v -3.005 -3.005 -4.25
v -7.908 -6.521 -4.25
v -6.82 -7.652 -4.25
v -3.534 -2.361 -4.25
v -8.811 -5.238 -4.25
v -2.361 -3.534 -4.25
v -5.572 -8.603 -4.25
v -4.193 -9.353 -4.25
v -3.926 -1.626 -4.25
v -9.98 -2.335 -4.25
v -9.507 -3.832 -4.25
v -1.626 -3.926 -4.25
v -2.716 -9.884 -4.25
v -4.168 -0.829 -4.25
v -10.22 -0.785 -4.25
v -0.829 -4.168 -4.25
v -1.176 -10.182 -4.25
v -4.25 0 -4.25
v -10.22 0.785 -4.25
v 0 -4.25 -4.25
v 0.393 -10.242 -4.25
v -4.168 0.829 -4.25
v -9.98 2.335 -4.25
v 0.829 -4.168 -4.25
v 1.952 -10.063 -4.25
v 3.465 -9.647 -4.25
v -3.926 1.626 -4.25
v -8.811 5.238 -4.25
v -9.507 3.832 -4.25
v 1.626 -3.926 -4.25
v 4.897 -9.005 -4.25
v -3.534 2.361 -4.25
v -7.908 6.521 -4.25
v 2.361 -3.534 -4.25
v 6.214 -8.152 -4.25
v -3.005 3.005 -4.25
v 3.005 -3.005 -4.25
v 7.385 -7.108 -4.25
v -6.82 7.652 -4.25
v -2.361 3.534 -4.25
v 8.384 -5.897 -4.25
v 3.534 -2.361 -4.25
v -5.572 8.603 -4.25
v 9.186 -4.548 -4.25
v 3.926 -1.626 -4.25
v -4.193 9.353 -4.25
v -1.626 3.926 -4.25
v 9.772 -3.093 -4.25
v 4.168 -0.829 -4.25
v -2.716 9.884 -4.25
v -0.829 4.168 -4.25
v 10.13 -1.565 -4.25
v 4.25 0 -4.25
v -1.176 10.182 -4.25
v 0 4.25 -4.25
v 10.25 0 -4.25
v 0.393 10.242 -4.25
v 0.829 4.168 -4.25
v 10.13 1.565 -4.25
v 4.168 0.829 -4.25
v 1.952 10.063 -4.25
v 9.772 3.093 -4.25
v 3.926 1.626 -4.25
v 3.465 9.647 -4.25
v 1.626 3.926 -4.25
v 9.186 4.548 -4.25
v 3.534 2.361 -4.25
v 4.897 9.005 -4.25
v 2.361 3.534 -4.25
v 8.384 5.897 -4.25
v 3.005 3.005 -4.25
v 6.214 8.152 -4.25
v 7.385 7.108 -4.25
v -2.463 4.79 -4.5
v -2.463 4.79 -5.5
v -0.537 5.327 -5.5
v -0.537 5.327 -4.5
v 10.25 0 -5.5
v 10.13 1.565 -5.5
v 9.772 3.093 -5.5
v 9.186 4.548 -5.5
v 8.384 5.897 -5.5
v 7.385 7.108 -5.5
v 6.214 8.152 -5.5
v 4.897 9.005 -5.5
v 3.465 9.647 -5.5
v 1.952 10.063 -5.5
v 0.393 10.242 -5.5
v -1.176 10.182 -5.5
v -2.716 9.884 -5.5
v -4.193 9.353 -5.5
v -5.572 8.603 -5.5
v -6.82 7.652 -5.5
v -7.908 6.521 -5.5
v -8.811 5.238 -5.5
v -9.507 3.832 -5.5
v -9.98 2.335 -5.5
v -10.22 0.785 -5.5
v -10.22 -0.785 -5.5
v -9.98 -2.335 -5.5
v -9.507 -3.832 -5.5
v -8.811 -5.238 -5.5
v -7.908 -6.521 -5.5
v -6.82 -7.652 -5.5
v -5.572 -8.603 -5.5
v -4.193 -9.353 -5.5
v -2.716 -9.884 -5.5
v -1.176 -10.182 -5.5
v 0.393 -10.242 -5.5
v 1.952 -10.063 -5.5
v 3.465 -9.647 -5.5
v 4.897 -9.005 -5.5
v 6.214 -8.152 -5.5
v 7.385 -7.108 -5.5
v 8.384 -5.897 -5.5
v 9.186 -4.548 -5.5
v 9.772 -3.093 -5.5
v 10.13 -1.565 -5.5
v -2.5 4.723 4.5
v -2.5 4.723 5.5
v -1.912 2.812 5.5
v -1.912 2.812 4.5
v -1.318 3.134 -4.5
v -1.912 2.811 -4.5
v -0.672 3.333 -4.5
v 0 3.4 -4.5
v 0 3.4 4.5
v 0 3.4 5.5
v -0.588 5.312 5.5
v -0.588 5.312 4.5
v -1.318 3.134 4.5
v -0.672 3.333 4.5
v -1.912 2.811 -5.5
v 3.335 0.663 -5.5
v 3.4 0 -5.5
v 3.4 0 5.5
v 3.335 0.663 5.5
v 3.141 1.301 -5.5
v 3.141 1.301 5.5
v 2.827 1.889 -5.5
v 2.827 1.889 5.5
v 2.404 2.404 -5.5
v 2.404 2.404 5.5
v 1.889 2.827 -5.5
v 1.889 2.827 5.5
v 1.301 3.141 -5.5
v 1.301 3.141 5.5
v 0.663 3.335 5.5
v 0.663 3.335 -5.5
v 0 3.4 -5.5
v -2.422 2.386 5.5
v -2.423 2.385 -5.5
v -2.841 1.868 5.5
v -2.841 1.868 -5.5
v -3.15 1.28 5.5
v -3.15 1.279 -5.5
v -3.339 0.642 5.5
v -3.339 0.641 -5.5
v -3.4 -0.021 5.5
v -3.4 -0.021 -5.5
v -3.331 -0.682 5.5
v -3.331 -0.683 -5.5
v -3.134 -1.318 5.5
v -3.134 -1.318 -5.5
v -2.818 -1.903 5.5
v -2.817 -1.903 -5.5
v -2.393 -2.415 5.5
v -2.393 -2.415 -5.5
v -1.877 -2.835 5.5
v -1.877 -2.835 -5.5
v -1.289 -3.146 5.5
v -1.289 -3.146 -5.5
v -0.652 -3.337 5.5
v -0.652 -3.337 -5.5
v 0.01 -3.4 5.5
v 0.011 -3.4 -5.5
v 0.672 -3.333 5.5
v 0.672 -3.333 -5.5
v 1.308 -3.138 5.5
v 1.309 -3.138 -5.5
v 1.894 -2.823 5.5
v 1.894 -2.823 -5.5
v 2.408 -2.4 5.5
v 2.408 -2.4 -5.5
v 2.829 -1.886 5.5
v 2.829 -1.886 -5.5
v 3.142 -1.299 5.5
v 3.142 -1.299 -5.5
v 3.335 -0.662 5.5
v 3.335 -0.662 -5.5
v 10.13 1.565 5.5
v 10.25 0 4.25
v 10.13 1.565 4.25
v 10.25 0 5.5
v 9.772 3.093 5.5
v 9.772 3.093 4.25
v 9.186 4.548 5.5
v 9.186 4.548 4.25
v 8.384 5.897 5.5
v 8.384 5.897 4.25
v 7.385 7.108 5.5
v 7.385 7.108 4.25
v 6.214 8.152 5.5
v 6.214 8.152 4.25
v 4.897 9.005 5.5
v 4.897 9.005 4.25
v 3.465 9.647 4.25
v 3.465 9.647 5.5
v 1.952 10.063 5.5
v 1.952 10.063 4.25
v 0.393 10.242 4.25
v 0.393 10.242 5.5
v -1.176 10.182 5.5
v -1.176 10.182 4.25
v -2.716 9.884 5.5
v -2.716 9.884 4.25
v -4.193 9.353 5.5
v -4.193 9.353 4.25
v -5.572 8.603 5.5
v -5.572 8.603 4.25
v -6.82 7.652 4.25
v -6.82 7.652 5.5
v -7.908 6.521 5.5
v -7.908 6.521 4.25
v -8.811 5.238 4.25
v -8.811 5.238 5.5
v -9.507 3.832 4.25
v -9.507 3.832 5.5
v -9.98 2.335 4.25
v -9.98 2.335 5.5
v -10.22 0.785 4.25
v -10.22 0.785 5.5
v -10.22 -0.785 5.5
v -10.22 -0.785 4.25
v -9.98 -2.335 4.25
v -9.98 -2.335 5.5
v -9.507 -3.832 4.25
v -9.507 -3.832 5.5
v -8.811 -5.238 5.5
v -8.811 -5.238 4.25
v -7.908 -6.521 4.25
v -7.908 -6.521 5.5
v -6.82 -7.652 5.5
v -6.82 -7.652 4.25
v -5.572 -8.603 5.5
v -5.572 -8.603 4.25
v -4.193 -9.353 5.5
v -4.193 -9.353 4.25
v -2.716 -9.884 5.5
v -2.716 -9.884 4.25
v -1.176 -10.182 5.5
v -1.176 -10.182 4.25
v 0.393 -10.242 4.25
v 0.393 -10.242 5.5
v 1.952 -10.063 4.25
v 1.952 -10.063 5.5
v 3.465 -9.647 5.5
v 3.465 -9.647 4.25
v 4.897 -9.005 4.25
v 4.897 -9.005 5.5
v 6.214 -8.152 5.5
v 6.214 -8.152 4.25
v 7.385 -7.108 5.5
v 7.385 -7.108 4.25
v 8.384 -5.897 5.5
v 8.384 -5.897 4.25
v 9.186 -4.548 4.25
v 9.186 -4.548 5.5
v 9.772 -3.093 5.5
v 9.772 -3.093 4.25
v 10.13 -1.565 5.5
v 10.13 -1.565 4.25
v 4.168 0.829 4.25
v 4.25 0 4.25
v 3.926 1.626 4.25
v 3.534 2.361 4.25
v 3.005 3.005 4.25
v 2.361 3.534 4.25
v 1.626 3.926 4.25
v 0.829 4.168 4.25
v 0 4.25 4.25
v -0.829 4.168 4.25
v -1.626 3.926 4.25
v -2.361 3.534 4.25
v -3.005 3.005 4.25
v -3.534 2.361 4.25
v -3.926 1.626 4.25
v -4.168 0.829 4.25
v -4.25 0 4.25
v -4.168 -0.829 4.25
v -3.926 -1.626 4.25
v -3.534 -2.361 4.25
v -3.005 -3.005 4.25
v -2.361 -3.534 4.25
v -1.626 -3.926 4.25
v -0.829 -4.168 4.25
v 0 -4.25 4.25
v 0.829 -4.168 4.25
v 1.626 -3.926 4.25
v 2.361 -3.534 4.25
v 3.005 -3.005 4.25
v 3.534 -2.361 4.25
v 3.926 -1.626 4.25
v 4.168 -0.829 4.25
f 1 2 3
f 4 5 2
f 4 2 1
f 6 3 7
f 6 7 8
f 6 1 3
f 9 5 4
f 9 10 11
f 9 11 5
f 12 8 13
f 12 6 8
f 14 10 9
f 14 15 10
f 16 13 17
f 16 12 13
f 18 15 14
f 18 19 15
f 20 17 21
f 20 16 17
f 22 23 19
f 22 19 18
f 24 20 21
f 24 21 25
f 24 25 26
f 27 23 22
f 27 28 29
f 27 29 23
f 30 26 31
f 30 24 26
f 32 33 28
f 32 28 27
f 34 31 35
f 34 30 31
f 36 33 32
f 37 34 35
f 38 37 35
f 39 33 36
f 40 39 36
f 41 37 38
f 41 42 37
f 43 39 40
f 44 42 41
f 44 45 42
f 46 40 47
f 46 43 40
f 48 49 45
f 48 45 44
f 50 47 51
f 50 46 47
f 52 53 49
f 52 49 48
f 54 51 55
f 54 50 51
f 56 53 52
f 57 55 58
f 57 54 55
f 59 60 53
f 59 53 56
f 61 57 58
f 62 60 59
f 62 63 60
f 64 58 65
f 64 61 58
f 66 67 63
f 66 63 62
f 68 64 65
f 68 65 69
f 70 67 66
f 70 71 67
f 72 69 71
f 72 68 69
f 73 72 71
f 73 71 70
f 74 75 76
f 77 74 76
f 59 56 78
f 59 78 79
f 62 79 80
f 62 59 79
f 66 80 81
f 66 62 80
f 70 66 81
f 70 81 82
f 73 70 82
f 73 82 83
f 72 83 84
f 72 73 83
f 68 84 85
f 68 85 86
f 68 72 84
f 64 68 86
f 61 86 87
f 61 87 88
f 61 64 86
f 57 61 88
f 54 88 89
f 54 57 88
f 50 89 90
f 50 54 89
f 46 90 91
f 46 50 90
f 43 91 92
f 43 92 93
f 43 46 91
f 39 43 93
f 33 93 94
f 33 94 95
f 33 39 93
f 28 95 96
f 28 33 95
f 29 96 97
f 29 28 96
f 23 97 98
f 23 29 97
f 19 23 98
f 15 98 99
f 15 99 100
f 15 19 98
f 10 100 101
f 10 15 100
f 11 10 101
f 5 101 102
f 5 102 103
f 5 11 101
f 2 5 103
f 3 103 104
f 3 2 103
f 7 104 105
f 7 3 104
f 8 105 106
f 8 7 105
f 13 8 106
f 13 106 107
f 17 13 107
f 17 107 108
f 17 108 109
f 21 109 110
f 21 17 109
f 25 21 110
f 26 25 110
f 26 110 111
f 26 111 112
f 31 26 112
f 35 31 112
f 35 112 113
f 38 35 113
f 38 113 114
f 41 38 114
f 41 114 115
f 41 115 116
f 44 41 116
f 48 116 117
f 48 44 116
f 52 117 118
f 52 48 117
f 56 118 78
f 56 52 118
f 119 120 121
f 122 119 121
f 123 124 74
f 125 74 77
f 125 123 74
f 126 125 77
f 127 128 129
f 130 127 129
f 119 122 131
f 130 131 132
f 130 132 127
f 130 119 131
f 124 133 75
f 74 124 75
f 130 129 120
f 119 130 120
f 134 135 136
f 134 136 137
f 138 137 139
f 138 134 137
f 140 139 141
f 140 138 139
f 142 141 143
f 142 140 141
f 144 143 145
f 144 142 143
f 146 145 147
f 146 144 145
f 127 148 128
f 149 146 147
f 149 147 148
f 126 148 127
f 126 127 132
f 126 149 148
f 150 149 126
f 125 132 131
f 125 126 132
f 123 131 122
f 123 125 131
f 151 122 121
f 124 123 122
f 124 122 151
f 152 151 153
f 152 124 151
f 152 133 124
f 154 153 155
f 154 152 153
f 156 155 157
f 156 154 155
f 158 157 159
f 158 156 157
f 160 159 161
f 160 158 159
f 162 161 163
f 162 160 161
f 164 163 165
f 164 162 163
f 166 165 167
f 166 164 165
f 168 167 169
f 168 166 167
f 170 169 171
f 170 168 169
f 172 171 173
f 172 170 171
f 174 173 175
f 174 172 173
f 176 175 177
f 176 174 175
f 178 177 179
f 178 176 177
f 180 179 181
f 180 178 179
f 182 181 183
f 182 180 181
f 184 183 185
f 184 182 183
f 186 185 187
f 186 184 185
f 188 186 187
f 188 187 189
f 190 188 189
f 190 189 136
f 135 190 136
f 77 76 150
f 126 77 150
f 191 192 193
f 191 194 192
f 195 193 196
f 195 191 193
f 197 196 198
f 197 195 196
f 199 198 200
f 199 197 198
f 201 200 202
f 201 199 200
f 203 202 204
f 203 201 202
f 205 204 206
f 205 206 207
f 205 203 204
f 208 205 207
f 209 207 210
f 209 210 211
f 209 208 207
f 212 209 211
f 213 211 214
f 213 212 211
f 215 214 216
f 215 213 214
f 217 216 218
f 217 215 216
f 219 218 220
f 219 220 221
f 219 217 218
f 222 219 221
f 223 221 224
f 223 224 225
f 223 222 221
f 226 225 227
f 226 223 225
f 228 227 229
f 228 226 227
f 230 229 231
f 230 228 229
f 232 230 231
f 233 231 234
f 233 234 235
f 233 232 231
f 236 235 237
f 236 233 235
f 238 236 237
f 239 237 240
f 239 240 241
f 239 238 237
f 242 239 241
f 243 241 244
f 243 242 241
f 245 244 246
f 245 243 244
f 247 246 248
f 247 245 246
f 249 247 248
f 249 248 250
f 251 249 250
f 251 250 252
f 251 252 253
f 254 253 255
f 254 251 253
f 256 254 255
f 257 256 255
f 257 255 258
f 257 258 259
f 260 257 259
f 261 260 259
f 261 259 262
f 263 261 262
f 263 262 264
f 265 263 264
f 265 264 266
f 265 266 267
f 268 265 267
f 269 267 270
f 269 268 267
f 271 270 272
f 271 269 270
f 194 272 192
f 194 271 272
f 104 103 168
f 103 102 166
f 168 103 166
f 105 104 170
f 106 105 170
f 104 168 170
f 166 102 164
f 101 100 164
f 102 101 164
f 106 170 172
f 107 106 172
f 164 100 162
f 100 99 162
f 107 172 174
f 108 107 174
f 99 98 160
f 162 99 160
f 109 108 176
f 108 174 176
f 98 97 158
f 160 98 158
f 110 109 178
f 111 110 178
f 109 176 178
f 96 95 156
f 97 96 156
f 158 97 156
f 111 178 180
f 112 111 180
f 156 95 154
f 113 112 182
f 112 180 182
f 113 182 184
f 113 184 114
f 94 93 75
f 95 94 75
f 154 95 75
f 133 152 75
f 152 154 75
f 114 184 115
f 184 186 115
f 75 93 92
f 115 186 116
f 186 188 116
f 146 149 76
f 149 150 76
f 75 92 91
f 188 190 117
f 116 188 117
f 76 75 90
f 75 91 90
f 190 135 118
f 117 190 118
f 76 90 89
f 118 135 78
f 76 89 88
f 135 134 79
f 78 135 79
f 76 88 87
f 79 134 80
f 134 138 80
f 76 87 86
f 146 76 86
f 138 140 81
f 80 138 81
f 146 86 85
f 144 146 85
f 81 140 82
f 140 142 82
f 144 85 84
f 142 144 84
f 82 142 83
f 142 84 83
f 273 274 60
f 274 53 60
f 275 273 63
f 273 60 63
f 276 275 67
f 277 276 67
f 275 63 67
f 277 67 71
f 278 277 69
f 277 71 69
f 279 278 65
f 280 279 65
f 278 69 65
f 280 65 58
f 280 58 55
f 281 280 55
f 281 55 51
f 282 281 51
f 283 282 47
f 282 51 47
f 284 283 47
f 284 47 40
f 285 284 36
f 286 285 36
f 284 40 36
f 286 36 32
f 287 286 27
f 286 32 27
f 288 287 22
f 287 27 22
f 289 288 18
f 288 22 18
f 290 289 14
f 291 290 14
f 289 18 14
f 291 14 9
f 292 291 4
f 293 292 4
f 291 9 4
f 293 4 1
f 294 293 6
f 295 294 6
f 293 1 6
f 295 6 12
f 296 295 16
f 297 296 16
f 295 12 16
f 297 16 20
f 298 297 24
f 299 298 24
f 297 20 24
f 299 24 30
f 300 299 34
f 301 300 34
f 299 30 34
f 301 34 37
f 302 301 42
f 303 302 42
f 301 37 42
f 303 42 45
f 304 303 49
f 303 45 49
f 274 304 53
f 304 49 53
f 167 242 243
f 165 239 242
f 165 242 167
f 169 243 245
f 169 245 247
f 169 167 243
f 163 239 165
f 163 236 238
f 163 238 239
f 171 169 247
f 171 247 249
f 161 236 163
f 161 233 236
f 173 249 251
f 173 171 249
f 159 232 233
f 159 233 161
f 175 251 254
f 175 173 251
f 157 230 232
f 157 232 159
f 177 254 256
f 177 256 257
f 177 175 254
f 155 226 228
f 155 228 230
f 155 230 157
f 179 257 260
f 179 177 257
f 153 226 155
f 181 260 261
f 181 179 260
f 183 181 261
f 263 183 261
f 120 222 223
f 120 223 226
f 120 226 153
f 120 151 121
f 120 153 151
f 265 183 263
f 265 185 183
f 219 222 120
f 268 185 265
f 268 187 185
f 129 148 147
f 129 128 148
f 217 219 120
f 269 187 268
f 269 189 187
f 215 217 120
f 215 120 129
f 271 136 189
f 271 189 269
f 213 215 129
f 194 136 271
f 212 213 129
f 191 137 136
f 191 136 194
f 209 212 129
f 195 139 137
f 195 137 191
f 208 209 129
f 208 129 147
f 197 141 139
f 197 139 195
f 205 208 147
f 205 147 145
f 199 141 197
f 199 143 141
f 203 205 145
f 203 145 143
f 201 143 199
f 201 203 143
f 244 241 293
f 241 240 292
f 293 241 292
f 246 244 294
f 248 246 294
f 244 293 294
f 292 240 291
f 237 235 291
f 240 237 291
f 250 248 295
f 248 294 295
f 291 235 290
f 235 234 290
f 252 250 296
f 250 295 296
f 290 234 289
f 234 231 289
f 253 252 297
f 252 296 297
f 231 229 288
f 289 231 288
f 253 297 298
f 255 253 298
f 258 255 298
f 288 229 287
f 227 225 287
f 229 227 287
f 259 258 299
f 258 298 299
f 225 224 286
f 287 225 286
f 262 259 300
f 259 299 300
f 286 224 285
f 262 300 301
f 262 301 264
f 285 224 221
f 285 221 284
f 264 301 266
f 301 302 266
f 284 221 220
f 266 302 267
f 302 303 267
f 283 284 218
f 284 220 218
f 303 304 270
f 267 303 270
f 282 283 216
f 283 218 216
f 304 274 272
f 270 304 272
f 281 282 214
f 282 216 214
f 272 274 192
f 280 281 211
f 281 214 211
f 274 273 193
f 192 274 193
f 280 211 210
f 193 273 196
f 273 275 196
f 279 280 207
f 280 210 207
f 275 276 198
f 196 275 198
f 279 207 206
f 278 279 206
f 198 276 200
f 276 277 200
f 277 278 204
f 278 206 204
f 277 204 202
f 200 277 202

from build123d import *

# Parameters (mm, degrees)
F0_R     = 10.25
F0_R_2   = 4.9
F0_R_3   = 3.4
F1_DEPTH = 5.5
F2_R     = 10.25
F2_R_2   = 4.25
F3_DEPTH = 4.25
F5_DEPTH = 1
F7_DEPTH = 1


with BuildPart() as f1:
    # F0 (on Top) → F1 (new body, symmetric)
    with BuildSketch(Plane.XY):
        Circle(F0_R)
        Circle(F0_R_2, mode=Mode.SUBTRACT)
        Circle(F0_R_2)
        Circle(F0_R_3, mode=Mode.SUBTRACT)
    extrude(amount=F1_DEPTH, both=True)

    # F2 (on Top) → F3 (cut, symmetric)
    with BuildSketch(Plane.XY):
        Circle(F2_R)
        Circle(F2_R_2, mode=Mode.SUBTRACT)
    extrude(amount=F3_DEPTH, both=True, mode=Mode.SUBTRACT)

    # F4 (on face) → F5 (cut)
    with BuildSketch(Plane.XY.offset(5.5)):
        with BuildLine():
            ThreePointArc((-1.911538, 2.811765), (-1, 3.249615), (0, 3.4))
            Line((0, 3.4), (-0.588235, 5.311538))
            Line((-0.588235, 5.311538), (-2.499774, 4.723303))
            Line((-2.499774, 4.723303), (-1.911538, 2.811765))
        make_face()
    extrude(amount=-F5_DEPTH, mode=Mode.SUBTRACT)

    # F6 (on face) → F7 (cut)
    with BuildSketch(Plane(origin=(0, 0, -5.5), x_dir=(1, 0, 0), z_dir=(0, 0, -1))):
        with BuildLine():
            ThreePointArc((0, -3.4), (-0.992761, -3.224814), (-1.912165, -2.811339))
            Line((-1.912165, -2.811339), (-2.463429, -4.789791))
            Line((-2.463429, -4.789791), (-0.536819, -5.32661))
            Line((-0.536819, -5.32661), (0, -3.4))
        make_face()
    extrude(amount=-F7_DEPTH, mode=Mode.SUBTRACT)


solid = f1.part
